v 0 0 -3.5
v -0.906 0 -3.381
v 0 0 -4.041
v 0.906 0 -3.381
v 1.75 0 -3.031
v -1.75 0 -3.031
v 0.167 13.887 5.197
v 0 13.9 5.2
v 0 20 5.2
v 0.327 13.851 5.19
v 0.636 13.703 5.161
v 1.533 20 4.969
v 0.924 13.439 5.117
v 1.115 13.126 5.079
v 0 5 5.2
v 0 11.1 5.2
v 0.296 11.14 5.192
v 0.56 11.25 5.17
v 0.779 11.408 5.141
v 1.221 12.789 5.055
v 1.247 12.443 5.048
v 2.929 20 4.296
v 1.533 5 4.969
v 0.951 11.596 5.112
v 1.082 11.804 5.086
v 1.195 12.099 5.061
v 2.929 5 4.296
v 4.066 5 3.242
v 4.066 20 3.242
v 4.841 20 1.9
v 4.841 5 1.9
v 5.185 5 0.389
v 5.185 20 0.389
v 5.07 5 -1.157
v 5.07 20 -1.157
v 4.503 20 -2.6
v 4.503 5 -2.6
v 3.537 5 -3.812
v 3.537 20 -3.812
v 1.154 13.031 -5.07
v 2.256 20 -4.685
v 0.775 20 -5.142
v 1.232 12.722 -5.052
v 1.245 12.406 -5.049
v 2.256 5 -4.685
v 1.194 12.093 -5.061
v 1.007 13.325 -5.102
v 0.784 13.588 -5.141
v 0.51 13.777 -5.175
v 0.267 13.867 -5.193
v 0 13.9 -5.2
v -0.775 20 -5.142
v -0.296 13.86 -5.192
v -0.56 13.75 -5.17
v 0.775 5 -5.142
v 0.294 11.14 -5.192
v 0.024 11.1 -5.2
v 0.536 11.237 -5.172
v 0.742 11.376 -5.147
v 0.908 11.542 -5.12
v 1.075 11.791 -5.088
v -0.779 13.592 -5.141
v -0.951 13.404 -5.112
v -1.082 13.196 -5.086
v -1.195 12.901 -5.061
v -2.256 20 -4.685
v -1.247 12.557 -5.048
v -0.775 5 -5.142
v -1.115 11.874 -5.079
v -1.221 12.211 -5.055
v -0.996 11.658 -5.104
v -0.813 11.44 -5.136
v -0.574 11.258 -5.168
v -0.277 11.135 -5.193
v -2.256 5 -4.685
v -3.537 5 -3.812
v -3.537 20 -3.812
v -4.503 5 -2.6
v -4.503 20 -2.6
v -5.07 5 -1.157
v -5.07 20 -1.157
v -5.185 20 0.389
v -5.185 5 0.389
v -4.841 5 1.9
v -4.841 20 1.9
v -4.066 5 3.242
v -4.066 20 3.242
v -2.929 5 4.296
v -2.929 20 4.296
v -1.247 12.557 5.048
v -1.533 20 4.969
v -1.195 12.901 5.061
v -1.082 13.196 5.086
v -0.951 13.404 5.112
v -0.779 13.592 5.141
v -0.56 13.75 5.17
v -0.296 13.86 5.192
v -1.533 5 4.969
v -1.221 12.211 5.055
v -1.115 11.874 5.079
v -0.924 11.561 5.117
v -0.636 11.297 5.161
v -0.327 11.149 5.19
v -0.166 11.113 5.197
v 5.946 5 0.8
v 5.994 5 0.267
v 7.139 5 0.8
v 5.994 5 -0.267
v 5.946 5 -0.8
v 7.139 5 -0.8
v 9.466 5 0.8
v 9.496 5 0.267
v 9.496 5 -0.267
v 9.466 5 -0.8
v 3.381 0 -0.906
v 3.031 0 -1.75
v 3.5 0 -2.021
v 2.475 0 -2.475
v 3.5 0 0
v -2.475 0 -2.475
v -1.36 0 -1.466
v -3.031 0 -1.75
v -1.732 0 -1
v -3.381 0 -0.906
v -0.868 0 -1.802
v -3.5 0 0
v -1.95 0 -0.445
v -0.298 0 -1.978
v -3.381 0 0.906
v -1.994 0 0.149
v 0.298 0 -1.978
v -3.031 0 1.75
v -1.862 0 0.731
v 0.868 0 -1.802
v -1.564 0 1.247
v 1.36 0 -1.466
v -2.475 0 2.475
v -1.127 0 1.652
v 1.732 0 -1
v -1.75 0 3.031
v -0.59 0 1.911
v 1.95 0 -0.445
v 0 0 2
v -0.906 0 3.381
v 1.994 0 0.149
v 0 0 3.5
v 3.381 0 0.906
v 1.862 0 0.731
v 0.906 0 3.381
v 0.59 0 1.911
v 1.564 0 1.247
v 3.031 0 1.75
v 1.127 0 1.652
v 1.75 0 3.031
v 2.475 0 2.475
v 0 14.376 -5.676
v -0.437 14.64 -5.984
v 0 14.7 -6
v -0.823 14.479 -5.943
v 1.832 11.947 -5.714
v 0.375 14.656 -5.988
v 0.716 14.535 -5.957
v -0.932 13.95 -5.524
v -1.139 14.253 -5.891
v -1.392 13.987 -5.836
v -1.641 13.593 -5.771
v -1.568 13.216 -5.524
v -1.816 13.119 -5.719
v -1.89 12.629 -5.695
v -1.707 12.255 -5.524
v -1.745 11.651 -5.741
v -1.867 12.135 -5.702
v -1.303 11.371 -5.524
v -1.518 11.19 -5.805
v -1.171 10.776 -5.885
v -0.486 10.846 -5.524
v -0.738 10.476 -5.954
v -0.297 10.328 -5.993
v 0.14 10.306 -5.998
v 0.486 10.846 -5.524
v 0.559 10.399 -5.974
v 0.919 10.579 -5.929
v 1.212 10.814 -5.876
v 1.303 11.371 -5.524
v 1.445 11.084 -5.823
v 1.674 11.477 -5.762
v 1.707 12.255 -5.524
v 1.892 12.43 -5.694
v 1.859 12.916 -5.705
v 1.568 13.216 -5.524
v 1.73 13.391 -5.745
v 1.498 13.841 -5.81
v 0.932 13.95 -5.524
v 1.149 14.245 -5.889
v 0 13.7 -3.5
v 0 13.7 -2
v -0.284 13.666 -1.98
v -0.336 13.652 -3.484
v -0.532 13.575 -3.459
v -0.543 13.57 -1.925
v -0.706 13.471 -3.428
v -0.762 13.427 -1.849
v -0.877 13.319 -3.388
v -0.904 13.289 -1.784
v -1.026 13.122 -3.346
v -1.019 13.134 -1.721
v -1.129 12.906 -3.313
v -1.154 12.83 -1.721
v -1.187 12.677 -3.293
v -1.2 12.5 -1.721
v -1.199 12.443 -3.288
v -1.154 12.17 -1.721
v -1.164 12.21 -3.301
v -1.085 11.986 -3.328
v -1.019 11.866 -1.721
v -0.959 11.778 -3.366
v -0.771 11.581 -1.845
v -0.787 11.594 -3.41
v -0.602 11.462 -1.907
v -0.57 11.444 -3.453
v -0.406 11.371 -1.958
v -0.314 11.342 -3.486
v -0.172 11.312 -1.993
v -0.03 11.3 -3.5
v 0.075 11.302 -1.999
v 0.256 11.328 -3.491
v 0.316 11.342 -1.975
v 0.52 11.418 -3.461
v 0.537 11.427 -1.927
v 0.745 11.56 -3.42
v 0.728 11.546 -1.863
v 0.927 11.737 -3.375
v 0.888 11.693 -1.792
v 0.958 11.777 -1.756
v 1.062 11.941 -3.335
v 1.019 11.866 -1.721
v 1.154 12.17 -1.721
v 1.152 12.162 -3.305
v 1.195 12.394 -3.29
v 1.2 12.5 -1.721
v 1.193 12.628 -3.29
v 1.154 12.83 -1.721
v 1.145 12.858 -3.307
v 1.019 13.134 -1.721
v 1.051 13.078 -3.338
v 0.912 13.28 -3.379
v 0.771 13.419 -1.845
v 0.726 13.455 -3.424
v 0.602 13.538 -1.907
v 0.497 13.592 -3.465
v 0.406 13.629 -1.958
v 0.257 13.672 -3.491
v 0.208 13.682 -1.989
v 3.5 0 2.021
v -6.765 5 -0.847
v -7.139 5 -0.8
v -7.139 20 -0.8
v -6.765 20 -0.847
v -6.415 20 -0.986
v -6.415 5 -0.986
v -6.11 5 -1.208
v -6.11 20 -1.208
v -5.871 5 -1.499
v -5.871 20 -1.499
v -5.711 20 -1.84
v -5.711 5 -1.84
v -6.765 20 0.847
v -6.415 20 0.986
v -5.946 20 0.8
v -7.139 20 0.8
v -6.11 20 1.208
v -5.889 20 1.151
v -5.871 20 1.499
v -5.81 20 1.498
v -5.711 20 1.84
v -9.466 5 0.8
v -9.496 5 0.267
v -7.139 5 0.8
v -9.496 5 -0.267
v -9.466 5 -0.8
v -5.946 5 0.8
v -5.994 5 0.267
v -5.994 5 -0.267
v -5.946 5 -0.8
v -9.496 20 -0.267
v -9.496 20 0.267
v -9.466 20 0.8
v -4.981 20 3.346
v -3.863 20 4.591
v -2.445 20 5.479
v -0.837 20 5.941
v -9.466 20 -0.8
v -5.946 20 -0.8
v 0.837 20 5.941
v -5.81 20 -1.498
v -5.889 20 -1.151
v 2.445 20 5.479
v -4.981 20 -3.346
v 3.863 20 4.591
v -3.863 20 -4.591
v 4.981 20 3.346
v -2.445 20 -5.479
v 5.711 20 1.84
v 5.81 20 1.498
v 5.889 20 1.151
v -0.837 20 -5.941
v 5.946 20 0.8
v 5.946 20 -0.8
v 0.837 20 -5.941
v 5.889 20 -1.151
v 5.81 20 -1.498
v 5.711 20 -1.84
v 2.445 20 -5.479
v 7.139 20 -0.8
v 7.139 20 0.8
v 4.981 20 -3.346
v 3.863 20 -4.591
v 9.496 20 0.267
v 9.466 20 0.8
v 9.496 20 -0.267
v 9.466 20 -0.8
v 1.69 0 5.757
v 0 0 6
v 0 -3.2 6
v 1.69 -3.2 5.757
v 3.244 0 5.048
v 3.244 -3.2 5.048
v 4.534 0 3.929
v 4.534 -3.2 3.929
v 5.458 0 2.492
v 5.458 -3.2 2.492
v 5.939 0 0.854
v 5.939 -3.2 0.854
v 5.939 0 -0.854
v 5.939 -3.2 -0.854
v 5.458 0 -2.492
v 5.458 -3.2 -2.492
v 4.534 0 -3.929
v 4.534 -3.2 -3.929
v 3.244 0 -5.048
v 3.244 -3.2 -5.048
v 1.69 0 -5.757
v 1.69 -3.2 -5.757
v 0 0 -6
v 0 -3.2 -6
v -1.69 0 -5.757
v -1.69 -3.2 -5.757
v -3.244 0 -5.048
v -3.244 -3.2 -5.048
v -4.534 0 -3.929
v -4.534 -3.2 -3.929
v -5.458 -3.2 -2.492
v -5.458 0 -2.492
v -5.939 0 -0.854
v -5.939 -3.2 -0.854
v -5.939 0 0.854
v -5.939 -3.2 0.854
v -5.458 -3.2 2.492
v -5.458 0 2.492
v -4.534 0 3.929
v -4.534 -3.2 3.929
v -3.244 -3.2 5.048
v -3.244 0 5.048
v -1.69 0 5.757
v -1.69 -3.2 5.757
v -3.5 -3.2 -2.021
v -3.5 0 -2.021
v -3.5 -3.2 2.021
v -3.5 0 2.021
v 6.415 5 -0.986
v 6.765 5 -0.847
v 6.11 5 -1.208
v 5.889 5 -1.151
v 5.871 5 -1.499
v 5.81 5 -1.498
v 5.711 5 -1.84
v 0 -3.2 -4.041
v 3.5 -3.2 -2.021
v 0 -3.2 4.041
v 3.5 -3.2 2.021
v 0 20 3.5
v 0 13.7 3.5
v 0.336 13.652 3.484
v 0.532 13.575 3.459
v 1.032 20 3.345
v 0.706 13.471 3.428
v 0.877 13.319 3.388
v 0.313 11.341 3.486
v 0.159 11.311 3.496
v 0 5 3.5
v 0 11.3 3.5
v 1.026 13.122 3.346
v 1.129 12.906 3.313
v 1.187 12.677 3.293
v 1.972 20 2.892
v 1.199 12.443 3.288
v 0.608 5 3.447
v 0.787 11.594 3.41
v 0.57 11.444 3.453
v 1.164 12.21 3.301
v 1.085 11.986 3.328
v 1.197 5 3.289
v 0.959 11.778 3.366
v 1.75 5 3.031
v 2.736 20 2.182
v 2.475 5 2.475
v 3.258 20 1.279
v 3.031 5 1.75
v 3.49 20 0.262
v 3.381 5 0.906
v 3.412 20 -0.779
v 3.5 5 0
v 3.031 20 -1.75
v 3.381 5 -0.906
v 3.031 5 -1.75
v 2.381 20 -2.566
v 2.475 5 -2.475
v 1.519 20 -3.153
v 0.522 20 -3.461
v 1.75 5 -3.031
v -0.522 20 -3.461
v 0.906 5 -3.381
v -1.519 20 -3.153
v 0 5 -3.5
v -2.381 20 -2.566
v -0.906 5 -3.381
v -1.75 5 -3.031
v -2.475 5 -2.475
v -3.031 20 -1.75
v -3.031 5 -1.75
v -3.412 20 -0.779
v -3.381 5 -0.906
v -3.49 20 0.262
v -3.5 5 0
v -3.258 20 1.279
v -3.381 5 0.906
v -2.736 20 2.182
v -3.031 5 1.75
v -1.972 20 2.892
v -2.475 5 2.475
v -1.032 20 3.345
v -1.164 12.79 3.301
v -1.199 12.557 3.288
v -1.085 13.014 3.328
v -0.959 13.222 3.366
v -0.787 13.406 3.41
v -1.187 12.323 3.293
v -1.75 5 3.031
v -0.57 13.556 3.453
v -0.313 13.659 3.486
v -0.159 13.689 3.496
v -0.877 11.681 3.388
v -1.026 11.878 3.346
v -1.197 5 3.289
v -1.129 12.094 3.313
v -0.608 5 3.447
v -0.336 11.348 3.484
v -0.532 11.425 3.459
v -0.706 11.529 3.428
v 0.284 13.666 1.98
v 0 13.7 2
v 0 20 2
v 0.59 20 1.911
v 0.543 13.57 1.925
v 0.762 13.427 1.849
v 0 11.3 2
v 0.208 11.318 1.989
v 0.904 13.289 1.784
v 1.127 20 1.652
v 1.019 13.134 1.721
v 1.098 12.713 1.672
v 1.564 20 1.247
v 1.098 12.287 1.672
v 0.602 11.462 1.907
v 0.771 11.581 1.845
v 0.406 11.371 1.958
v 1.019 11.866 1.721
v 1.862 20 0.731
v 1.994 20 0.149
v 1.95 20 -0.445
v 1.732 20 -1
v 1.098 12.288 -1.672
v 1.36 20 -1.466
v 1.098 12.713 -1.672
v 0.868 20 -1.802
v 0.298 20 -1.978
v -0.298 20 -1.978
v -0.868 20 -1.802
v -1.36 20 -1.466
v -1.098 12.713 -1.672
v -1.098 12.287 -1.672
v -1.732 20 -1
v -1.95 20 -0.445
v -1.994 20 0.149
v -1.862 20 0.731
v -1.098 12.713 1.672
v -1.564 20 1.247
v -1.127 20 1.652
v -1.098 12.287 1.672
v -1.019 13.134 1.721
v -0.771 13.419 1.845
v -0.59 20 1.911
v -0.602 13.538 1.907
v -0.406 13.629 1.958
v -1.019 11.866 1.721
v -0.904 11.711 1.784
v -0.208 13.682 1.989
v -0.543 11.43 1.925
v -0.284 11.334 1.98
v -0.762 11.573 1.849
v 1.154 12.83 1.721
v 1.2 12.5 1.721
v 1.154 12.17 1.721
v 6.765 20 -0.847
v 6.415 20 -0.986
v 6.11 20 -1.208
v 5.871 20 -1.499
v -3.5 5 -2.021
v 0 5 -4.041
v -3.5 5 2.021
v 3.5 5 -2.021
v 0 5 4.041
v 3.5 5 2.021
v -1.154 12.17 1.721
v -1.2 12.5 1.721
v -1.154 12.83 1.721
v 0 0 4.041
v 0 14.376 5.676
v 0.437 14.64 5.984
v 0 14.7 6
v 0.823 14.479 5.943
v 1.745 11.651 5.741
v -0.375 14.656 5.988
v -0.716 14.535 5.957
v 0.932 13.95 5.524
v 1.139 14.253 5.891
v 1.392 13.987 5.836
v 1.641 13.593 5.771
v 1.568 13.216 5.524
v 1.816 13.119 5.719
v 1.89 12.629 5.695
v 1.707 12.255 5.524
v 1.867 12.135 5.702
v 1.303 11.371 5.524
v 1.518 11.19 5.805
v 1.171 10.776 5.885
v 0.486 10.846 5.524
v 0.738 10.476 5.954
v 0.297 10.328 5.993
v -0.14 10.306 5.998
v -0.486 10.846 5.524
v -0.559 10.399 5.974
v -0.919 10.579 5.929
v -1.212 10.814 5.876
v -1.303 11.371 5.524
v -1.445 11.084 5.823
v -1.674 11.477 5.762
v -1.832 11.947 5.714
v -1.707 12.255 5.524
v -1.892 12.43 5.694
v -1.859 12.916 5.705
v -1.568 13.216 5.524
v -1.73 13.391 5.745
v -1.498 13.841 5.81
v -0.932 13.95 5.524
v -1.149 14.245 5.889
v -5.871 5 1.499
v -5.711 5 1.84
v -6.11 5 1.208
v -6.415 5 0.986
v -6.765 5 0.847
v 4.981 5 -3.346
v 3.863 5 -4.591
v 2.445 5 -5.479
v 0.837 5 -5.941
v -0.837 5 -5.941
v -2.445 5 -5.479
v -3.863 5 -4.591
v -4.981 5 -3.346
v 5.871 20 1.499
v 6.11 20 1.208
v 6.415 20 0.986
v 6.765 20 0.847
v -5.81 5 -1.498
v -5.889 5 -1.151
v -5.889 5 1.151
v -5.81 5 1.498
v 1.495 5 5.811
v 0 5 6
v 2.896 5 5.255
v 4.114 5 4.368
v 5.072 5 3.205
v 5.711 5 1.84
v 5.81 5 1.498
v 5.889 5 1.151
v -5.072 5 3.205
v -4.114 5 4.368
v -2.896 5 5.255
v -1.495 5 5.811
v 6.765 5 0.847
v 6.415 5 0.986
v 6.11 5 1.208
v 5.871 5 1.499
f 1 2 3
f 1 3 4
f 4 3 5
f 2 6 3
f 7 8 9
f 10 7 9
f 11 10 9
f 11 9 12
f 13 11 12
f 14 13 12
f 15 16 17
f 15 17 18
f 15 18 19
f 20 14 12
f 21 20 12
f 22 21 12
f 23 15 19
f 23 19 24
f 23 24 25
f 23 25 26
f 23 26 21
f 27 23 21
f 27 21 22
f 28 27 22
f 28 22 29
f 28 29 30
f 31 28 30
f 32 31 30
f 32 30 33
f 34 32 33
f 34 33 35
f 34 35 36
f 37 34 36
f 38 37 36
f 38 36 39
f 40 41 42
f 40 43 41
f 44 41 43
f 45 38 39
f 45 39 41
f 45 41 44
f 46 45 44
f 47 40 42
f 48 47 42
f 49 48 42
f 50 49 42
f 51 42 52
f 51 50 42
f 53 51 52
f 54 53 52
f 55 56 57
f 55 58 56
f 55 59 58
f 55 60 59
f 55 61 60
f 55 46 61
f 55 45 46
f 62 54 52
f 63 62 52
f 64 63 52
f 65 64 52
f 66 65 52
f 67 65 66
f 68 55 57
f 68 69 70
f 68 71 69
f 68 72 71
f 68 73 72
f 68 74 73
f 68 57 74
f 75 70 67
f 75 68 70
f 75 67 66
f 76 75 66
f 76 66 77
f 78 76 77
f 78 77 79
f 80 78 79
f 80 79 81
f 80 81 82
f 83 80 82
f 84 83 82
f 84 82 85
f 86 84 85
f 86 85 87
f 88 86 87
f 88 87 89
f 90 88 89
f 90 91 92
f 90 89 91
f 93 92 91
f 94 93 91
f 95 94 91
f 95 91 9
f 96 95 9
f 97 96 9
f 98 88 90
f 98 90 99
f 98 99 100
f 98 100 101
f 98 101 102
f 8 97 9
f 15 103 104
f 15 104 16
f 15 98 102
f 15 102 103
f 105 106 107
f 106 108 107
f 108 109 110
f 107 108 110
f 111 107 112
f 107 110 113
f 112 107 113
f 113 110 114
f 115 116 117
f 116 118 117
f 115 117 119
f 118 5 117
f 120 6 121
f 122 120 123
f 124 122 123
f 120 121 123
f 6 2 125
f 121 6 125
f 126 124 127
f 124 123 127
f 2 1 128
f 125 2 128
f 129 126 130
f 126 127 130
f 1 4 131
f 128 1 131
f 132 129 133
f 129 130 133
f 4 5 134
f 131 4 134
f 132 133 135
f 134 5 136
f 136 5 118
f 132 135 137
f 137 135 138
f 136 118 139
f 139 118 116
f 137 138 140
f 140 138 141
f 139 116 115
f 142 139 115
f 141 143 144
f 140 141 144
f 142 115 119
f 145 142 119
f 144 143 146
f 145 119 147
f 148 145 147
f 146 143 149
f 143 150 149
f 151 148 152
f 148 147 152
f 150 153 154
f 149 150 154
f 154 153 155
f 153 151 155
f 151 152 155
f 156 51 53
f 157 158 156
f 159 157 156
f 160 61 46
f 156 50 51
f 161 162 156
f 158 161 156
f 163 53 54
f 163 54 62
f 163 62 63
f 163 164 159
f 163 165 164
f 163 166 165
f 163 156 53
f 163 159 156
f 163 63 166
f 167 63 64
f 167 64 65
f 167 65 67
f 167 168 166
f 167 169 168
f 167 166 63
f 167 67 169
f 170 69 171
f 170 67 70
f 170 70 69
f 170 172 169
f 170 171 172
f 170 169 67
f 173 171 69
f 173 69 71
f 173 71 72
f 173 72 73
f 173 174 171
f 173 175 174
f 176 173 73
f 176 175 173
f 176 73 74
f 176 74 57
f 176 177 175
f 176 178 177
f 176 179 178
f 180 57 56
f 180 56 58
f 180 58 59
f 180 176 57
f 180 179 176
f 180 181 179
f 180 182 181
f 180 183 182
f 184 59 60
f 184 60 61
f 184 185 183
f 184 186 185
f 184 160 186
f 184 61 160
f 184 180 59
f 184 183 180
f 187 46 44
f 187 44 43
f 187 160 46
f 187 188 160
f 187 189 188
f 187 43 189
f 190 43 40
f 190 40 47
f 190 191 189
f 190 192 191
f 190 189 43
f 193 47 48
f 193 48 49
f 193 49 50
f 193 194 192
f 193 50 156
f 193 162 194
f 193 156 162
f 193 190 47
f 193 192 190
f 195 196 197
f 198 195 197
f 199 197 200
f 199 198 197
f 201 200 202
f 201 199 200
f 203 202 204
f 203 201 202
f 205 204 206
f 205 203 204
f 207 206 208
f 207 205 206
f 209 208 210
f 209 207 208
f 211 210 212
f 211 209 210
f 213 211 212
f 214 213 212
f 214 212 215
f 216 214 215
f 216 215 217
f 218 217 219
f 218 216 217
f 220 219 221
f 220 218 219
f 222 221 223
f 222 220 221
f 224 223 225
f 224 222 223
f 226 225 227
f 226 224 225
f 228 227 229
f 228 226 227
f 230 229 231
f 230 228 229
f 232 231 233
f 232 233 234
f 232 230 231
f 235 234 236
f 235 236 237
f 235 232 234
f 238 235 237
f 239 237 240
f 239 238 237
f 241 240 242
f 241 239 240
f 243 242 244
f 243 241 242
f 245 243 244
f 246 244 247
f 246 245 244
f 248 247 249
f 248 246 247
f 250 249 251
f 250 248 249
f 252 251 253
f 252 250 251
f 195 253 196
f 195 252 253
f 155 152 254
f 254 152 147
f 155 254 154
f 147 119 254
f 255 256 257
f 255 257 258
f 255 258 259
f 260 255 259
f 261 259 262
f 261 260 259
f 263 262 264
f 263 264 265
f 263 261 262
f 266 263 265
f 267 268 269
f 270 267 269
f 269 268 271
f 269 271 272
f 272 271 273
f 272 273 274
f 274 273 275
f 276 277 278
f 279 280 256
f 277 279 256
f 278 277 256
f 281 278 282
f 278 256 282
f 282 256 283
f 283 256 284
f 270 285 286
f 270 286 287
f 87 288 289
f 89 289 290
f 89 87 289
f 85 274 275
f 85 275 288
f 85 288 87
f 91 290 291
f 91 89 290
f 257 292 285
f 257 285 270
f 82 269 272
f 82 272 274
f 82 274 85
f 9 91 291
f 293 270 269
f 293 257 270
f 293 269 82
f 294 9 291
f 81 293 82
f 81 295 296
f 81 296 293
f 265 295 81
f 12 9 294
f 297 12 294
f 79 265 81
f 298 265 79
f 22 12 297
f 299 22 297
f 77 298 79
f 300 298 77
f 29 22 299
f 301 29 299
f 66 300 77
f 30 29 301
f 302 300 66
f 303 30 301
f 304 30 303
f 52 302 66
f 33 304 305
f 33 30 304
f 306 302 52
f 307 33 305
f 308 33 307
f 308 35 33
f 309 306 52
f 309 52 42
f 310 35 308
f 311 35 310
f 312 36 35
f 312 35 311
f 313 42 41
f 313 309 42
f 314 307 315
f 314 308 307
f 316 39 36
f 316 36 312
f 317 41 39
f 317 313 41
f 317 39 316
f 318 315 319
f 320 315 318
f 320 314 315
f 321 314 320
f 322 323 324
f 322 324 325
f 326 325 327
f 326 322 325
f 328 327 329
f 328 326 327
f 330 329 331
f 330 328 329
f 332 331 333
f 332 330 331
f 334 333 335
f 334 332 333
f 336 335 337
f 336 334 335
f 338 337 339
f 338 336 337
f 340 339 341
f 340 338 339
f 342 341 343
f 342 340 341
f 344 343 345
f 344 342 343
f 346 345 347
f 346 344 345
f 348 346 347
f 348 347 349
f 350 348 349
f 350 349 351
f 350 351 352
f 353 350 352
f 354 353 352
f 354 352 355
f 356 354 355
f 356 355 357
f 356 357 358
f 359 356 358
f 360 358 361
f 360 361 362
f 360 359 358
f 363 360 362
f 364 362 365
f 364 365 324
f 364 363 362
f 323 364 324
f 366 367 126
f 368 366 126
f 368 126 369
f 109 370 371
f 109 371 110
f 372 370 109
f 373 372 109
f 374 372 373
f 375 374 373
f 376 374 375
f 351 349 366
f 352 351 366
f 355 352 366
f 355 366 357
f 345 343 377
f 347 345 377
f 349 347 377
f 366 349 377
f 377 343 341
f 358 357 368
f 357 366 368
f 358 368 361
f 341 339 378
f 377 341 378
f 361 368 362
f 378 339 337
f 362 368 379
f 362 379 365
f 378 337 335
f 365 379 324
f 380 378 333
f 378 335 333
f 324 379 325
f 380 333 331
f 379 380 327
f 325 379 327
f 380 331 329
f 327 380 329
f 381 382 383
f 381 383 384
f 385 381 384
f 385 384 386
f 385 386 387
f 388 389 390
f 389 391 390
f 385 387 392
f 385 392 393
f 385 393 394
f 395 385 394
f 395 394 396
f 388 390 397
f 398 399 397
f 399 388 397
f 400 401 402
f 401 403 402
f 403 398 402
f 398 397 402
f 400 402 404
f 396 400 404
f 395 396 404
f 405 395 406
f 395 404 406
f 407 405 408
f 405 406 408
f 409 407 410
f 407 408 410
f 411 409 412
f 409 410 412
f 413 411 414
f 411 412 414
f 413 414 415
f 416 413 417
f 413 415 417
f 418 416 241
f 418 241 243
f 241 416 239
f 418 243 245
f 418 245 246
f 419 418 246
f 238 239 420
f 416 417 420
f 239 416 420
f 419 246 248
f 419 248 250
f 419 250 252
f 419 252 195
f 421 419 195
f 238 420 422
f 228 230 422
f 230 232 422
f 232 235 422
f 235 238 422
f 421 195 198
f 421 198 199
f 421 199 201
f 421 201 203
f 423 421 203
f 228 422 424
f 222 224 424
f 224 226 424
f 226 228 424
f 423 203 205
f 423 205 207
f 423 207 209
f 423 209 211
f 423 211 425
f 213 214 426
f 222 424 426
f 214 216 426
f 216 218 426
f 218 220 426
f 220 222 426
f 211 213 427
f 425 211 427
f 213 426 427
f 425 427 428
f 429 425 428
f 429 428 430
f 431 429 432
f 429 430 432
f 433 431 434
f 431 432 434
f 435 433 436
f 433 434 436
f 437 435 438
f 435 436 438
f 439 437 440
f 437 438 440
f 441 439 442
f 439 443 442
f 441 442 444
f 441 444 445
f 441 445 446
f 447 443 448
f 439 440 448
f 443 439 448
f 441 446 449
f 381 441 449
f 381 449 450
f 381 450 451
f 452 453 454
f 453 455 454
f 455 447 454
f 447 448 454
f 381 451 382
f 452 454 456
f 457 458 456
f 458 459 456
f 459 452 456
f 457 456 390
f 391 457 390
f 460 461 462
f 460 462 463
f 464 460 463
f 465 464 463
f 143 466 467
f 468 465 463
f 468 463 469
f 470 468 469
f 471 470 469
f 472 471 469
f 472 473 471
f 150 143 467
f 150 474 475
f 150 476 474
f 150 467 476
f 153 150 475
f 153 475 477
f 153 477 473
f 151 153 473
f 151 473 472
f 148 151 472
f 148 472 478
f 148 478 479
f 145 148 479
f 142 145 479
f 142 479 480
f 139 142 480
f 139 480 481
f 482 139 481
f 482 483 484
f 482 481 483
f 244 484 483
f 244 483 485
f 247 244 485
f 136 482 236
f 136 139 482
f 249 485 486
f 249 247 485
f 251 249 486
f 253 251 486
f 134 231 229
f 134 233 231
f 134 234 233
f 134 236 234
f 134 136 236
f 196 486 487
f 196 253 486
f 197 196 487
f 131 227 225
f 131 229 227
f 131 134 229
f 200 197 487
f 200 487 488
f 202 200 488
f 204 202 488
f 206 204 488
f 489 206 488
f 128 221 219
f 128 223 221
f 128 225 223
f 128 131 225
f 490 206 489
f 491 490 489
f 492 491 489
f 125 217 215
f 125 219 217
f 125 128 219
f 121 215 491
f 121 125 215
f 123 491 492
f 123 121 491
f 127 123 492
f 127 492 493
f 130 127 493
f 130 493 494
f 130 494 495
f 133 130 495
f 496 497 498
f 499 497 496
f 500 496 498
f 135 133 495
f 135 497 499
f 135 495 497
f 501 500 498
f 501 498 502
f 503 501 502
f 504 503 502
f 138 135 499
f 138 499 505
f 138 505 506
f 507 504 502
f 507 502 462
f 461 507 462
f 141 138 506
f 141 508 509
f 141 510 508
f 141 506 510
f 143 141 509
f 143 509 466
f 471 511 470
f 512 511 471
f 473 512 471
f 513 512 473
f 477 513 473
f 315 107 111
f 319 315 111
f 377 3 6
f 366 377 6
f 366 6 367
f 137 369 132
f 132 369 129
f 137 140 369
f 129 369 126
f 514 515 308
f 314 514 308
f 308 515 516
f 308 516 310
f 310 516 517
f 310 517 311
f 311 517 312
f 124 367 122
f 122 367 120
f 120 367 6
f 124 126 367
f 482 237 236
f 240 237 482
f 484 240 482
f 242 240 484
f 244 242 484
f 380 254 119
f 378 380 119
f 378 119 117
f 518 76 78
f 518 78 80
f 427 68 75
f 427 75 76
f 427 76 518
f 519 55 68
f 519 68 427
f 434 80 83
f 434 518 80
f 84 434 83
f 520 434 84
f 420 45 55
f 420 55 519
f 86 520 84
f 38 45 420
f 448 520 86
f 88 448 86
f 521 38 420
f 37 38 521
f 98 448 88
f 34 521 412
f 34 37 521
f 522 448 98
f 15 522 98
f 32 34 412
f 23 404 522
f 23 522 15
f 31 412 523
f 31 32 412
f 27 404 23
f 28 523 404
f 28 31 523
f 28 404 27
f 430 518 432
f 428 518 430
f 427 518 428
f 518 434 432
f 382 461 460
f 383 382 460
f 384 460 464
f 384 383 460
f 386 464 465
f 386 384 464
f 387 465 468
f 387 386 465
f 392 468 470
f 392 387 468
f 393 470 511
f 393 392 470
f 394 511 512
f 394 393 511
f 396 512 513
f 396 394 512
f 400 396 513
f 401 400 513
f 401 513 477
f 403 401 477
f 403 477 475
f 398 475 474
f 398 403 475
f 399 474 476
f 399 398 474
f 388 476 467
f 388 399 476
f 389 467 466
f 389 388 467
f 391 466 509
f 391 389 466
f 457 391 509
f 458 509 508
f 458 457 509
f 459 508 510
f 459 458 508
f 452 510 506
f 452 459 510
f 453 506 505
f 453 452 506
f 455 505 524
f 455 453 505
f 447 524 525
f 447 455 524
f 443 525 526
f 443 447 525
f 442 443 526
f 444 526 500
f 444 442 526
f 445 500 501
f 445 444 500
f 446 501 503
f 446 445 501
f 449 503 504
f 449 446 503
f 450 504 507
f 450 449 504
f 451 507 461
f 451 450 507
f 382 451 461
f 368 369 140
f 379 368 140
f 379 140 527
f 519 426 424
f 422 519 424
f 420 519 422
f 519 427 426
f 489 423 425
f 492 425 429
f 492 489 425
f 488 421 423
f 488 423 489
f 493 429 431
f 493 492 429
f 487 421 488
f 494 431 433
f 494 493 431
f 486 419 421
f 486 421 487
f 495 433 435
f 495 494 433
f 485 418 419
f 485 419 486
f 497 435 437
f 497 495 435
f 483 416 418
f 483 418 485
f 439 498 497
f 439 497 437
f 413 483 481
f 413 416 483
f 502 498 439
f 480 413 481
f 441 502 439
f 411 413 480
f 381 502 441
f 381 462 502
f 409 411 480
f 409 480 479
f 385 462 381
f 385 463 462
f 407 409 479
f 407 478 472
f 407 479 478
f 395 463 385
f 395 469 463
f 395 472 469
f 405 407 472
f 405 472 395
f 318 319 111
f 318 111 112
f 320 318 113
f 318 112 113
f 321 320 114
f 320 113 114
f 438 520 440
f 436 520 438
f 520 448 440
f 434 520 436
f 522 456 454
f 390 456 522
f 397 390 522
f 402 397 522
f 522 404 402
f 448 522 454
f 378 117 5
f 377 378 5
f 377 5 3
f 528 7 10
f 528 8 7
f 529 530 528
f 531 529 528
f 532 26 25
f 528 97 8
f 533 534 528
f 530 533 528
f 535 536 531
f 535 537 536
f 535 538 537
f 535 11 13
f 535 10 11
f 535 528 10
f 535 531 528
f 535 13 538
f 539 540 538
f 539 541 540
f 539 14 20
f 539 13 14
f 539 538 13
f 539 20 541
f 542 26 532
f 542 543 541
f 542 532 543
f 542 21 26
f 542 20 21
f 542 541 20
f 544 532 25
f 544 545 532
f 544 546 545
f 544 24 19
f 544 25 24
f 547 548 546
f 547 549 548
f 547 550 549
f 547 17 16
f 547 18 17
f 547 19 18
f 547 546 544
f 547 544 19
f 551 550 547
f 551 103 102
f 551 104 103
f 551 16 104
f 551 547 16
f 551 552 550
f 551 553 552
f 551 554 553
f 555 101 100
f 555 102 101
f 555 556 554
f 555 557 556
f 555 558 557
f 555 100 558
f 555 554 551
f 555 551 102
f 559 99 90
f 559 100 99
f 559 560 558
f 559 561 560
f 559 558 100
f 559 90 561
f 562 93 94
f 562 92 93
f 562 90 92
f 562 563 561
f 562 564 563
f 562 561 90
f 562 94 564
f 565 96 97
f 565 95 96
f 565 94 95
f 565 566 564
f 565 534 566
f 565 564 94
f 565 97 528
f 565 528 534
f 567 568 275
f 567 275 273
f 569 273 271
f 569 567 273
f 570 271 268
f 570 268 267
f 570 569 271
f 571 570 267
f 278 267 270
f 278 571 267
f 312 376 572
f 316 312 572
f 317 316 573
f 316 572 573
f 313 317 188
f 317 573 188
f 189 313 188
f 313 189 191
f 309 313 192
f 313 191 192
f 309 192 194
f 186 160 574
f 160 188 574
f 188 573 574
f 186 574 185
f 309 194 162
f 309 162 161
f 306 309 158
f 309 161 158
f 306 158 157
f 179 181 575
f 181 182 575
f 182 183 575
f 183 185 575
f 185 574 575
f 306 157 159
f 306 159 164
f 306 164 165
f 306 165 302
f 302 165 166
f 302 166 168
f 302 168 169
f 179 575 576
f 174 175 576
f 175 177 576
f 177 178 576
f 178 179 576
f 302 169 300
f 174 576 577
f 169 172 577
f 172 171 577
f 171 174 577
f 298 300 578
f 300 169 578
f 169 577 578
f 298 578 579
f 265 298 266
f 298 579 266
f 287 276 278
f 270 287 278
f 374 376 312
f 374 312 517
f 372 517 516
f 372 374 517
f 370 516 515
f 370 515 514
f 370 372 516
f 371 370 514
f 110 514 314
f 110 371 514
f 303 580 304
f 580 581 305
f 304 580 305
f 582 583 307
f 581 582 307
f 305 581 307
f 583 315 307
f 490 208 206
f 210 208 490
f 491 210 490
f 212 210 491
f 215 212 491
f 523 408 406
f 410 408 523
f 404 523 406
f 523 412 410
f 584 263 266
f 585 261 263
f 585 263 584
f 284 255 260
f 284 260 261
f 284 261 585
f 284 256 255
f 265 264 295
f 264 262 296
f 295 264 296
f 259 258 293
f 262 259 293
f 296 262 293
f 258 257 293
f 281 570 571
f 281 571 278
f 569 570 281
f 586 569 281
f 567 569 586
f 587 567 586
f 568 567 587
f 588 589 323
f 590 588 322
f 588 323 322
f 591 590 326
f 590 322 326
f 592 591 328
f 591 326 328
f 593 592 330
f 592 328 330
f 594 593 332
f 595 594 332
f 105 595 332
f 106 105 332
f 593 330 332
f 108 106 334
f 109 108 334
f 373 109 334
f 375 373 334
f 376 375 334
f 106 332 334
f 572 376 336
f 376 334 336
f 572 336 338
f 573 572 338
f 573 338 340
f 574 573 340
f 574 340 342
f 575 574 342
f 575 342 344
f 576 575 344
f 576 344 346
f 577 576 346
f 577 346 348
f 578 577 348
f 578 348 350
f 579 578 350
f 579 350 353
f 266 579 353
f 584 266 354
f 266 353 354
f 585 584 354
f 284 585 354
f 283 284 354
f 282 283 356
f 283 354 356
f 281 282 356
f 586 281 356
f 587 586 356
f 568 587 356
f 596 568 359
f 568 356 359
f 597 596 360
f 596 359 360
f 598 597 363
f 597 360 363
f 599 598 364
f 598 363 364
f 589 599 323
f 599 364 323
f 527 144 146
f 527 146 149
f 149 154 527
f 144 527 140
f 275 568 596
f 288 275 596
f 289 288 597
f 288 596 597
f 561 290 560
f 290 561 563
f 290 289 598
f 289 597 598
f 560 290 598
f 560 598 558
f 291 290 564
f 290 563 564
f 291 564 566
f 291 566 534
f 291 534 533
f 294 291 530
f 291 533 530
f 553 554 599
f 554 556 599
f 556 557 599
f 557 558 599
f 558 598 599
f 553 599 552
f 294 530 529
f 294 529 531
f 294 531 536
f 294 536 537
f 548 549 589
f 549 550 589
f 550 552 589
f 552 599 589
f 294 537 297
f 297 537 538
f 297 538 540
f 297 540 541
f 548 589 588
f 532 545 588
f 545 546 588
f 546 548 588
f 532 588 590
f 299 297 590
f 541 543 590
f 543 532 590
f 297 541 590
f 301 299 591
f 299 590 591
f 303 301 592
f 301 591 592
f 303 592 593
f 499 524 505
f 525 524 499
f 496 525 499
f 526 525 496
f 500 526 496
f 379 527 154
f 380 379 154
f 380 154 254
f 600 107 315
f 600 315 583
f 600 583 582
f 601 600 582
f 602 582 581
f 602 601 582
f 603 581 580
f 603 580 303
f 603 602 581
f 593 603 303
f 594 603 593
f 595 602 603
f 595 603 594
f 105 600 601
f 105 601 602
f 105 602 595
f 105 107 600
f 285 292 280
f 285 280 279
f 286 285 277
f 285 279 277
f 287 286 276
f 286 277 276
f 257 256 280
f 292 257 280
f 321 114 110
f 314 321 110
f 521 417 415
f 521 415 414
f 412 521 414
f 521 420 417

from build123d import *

# Parameters (mm, degrees)
SKETCH1_R           = 3.5
SKETCH1_R_2         = 2
BOSS_EXTRUDE1_DEPTH = 20
SKETCH1_3_R         = 6
BOSS_EXTRUDE2_DEPTH = 3.2
SKETCH1_4_R         = 6
BOSS_EXTRUDE3_DEPTH = 5
SKETCH2_R           = 5.2
BOSS_EXTRUDE4_DEPTH = 15
CIRPATTERN1_COUNT   = 2
FILLET1_R           = 1.5


with BuildPart() as part:
    # Sketch1 → Boss-Extrude1 (new body)
    with BuildSketch(Plane(origin=(0, 0, 0), x_dir=(1, 0, 0), z_dir=(0, 1, 0))):
        with Locations(Location((0, 0, 0), (0, 0, 270))):
            Circle(SKETCH1_R)
        with Locations(Location((0, 0, 0), (0, 0, 270))):
            Circle(SKETCH1_R_2, mode=Mode.SUBTRACT)
    extrude(amount=BOSS_EXTRUDE1_DEPTH)



with BuildPart() as body_2:
    # Sketch1<3> → Boss-Extrude2 (new body)
    with BuildSketch(Plane(origin=(0, 0, 0), x_dir=(1, 0, 0), z_dir=(0, 1, 0))):
        with Locations(Location((0, 0, 0), (0, 0, 270))):
            Circle(SKETCH1_3_R)
        Polygon((0, -4.041451884), (3.5, -2.020725942), (3.5, 2.020725942), (0, 4.041451884), (-3.5, 2.020725942), (-3.5, -2.020725942), align=None, mode=Mode.SUBTRACT)
    extrude(amount=-BOSS_EXTRUDE2_DEPTH)


with BuildPart() as part_1:
    add(part.part)

    add(body_2.part)  # Boss-Extrude3 merges body 2
    # Sketch1<4> → Boss-Extrude3 (add)
    # profile 1 of 7: a face of its own
    with BuildSketch(Plane(origin=(0, 0, 0), x_dir=(1, 0, 0), z_dir=(0, 1, 0))):
        with Locations(Location((0, 0, 0), (0, 0, 270))):
            Circle(SKETCH1_4_R)
        Polygon((0, -4.041451884), (3.5, -2.020725942), (3.5, 2.020725942), (0, 4.041451884), (-3.5, 2.020725942), (-3.5, -2.020725942), align=None, mode=Mode.SUBTRACT)
    # profile 2 of 7: a face of its own
    with BuildSketch(Plane(origin=(0, 0, 0), x_dir=(1, 0, 0), z_dir=(0, 1, 0))):
        with BuildLine():
            ThreePointArc((-1.749999906, 3.031088968), (8.8e-08, 3.5), (1.750000057, 3.03108888))
            Line((1.750000057, 3.03108888), (0, 4.041451884))
            Line((0, 4.041451884), (-1.749999906, 3.031088968))
        make_face()
    # profile 3 of 7: a face of its own
    with BuildSketch(Plane(origin=(0, 0, 0), x_dir=(1, 0, 0), z_dir=(0, 1, 0))):
        with BuildLine():
            ThreePointArc((1.750000057, 3.03108888), (3.03108893, 1.749999971), (3.5, 0))
            Line((3.5, 0), (3.5, 2.020725942))
            Line((3.5, 2.020725942), (1.750000057, 3.03108888))
        make_face()
    # profile 4 of 7: a face of its own
    with BuildSketch(Plane(origin=(0, 0, 0), x_dir=(1, 0, 0), z_dir=(0, 1, 0))):
        with BuildLine():
            Line((1.750000074, -3.03108887), (3.5, -2.020725942))
            Line((3.5, -2.020725942), (3.5, 0))
            ThreePointArc((3.5, 0), (3.031088935, -1.749999963), (1.750000074, -3.03108887))
        make_face()
    # profile 5 of 7: a face of its own
    with BuildSketch(Plane(origin=(0, 0, 0), x_dir=(1, 0, 0), z_dir=(0, 1, 0))):
        with BuildLine():
            Line((0, -4.041451884), (1.750000074, -3.03108887))
            ThreePointArc((1.750000074, -3.03108887), (5.1e-08, -3.5), (-1.749999986, -3.031088921))
            Line((-1.749999986, -3.031088921), (0, -4.041451884))
        make_face()
    # profile 6 of 7: a face of its own
    with BuildSketch(Plane(origin=(0, 0, 0), x_dir=(1, 0, 0), z_dir=(0, 1, 0))):
        with BuildLine():
            Line((-3.5, -2.020725942), (-1.749999986, -3.031088921))
            ThreePointArc((-1.749999986, -3.031088921), (-3.031088909, -1.750000007), (-3.5, 0))
            Line((-3.5, 0), (-3.5, -2.020725942))
        make_face()
    # profile 7 of 7: a face of its own
    with BuildSketch(Plane(origin=(0, 0, 0), x_dir=(1, 0, 0), z_dir=(0, 1, 0))):
        with BuildLine():
            ThreePointArc((-3.5, 0), (-3.031088886, 1.750000047), (-1.749999906, 3.031088968))
            Line((-1.749999906, 3.031088968), (-3.5, 2.020725942))
            Line((-3.5, 2.020725942), (-3.5, 0))
        make_face()
    extrude(amount=BOSS_EXTRUDE3_DEPTH)

    # Sketch2 → Boss-Extrude4 (add)
    with BuildSketch(Plane(origin=(0, 5, 0), x_dir=(1, 0, 0), z_dir=(0, 1, 0))):
        with BuildLine():
            Line((-9.46625586, -0.8), (-5.946427499, -0.8))
            ThreePointArc((-5.946427499, -0.8), (0, -6), (5.946427499, -0.8))
            Line((5.946427499, -0.8), (9.46625586, -0.8))
            ThreePointArc((9.46625586, -0.8), (9.5, 0), (9.46625586, 0.8))
            Line((9.46625586, 0.8), (5.946427499, 0.8))
            ThreePointArc((5.946427499, 0.8), (0, 6), (-5.946427499, 0.8))
            Line((-5.946427499, 0.8), (-9.46625586, 0.8))
            ThreePointArc((-9.46625586, 0.8), (-9.5, 0), (-9.46625586, -0.8))
        make_face()
        with Locations(Location((0, 0, 0), (0, 0, 270))):
            Circle(SKETCH2_R, mode=Mode.SUBTRACT)
    extrude(amount=BOSS_EXTRUDE4_DEPTH)

    # Sketch5 → CSK for M2 Flat Head Machine Screw1 (revolve, cut)
    with BuildSketch(Plane(origin=(0, 12.5, -6), x_dir=(0, 1, 0), z_dir=(1, 0, 0))):
        Polygon((0, 0), (0, 5), (1.2, 4.278967257), (1.2, 1), (2.2, 0), align=None)
    csk_for_m2_flat_head_machine_screw1 = revolve(axis=Axis((0, 12.5, -12.35), (0, 0, 1)), mode=Mode.SUBTRACT)

    # CirPattern1: CSK for M2 Flat Head Machine Screw1 ×2 about axis
    cirpattern1_axis = Axis((0, 5, 0), (0, -1, 0))
    for i in range(1, CIRPATTERN1_COUNT):
        add(csk_for_m2_flat_head_machine_screw1.rotate(cirpattern1_axis, i * 360 / CIRPATTERN1_COUNT), mode=Mode.SUBTRACT)

    # Fillet1
    # the kernel refuses this fillet: 1.5 mm, written as the material it adds along each edge
    with BuildSketch(Plane(origin=(-5.946427499, 5, 0.8), x_dir=(-1, 0, 0), z_dir=(0, 1, 0)), Plane(origin=(5.946427499, 5, -0.8), x_dir=(1, 0, 0), z_dir=(0, 1, 0))) as fillet1_piece_1:
        with BuildLine():
            CenterArc((1.19219982, 1.5), FILLET1_R, 197.858462698, 72.141537302)
            ThreePointArc((-0.235525644, 1.04), (-0.094613086, 0.52524265), (0, 0))
            Line((0, 0), (1.19219982, 0))
        make_face()
    extrude(amount=15)
    with BuildSketch(Plane(origin=(5.946427499, 5, 0.8), x_dir=(1, 0, 0), z_dir=(0, 1, 0)), Plane(origin=(-5.946427499, 5, -0.8), x_dir=(-1, 0, 0), z_dir=(0, 1, 0))) as fillet1_piece_2:
        with BuildLine():
            CenterArc((1.19219982, -1.5), FILLET1_R, 90, 72.141537302)
            ThreePointArc((-0.235525644, -1.04), (-0.094613086, -0.52524265), (0, 0))
            Line((0, 0), (1.19219982, 0))
        make_face()
    extrude(amount=15)


solid = part_1.part
